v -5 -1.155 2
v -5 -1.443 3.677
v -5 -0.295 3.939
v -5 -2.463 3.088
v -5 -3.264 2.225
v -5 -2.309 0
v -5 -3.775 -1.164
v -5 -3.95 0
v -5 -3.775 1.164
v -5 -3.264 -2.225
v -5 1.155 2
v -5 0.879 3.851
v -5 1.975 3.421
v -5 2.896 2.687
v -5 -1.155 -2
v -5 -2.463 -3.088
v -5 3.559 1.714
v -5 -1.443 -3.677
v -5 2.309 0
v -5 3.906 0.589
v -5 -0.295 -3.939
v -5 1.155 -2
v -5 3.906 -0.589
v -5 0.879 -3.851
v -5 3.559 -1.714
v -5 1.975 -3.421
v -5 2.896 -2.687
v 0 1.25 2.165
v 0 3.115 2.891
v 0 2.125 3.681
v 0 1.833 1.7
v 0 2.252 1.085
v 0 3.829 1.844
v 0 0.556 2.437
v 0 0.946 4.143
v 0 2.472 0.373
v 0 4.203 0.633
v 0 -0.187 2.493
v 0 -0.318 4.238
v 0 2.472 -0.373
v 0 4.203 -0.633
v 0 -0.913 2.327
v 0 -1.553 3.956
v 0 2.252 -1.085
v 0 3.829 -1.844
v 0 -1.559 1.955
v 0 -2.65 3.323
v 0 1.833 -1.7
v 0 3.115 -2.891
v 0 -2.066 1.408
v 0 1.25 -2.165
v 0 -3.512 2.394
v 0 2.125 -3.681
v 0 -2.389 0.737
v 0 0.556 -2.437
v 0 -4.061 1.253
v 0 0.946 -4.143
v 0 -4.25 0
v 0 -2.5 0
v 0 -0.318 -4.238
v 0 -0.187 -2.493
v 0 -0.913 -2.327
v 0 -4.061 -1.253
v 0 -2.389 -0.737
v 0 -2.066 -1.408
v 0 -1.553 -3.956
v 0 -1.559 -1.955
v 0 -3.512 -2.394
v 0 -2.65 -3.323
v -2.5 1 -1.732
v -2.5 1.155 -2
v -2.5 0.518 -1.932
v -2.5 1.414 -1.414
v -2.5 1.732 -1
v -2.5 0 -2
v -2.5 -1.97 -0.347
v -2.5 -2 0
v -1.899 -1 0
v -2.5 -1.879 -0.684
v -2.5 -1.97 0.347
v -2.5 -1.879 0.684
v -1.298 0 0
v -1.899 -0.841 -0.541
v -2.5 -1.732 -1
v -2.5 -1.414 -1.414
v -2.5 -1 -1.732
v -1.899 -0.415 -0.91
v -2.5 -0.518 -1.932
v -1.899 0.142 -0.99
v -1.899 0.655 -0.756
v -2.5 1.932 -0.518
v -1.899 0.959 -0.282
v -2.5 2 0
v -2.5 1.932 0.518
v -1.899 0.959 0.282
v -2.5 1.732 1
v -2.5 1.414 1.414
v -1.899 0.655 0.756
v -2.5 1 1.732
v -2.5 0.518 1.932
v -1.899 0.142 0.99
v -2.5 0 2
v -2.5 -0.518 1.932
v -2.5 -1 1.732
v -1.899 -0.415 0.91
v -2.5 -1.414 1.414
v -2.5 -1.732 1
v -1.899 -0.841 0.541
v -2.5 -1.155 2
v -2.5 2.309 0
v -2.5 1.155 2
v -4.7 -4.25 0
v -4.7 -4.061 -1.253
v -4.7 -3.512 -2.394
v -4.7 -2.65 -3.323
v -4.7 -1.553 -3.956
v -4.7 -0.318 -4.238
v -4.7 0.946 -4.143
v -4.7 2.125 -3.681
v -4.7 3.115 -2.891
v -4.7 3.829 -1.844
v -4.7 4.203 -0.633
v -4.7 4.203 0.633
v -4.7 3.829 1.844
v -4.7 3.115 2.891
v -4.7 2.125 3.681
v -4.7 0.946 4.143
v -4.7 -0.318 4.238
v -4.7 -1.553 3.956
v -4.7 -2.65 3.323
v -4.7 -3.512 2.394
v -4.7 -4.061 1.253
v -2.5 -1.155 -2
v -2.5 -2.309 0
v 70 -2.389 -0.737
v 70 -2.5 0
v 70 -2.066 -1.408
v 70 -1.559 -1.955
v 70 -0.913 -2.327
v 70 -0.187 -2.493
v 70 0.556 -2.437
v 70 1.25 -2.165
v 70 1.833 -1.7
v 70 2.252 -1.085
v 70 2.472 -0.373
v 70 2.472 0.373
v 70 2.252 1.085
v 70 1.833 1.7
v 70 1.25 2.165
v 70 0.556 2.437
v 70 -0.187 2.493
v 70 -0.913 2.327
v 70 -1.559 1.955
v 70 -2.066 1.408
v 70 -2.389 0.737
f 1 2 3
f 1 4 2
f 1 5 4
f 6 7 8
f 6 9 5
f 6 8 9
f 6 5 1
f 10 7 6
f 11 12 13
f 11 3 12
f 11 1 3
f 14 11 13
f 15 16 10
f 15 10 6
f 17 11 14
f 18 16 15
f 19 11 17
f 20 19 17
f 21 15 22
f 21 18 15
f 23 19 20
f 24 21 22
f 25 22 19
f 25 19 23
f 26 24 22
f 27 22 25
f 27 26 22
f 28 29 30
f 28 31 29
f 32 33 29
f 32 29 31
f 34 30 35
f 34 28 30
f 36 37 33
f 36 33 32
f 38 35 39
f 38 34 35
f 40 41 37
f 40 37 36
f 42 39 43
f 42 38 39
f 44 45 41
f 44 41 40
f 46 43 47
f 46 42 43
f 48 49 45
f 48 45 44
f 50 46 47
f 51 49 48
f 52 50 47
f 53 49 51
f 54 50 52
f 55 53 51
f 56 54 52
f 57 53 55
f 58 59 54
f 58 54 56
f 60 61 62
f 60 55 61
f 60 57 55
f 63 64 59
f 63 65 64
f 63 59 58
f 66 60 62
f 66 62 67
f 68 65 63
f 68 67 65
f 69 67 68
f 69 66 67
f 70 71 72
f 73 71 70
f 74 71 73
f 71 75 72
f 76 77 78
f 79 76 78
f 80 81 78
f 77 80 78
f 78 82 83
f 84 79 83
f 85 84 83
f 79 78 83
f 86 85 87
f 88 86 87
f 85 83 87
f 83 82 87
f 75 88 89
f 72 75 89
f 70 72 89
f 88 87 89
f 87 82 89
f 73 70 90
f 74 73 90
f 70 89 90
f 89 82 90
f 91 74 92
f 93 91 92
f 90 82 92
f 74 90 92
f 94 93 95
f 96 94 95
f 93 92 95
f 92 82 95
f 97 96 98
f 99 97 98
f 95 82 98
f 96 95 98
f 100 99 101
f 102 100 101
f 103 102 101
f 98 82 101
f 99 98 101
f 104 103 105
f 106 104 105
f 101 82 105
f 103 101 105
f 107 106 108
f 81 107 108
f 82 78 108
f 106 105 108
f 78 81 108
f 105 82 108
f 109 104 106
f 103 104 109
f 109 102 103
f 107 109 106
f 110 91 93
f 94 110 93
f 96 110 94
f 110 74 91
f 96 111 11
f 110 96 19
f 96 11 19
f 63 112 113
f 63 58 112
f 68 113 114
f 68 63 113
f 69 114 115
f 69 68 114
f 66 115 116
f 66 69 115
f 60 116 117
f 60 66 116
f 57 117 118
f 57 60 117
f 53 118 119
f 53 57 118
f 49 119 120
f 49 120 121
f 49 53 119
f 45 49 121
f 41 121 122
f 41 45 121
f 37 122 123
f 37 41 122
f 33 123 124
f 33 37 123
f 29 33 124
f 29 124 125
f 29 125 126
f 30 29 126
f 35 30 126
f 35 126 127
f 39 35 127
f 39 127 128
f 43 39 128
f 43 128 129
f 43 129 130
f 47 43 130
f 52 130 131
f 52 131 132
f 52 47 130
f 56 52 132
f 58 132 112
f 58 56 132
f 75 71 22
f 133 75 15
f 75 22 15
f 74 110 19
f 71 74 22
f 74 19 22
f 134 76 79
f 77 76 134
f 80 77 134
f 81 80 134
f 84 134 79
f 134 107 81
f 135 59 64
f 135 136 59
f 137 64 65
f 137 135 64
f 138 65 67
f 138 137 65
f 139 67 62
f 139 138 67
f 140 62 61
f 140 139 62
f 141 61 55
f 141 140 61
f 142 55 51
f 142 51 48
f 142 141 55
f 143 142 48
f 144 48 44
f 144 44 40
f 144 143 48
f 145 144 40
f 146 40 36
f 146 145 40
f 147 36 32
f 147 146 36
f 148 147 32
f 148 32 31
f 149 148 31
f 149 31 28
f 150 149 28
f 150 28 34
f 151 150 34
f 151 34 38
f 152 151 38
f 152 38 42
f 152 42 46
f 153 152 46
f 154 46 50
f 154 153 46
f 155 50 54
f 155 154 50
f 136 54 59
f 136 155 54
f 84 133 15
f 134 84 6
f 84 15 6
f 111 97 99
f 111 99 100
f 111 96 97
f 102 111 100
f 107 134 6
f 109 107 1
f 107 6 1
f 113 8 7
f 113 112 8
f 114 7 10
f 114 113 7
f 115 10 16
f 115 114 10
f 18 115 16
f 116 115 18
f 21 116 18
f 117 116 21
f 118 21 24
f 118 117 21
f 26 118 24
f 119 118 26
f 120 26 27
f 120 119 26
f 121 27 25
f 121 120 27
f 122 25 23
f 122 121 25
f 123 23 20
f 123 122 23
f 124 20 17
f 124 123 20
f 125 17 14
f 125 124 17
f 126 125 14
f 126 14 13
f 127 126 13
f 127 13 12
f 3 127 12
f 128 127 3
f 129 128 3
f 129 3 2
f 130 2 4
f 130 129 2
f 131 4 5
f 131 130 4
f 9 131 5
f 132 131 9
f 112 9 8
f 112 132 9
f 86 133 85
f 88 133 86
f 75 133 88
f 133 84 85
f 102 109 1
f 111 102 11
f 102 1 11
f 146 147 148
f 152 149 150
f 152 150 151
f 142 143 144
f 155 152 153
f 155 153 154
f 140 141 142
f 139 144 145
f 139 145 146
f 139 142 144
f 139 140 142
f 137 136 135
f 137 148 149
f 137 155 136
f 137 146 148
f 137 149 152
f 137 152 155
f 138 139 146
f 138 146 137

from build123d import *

# Parameters (mm, degrees)
CUT_EXTRUDE1_DEPTH = 2.5


with BuildPart() as part:
    # Sketch1 → Revolve1 (revolve)
    with BuildSketch(Plane.XY, mode=Mode.PRIVATE) as revolve1_sk:
        Polygon((-5, 0), (-5, 3.95), (-4.7, 4.25), (0, 4.25), (0, 2.5), (70, 2.5), (70, 0), align=None)
    revolve(revolve1_sk.sketch.rotate(Axis((-5, 0, 0), (1, 0, 0)), 180), axis=Axis((-5, 0, 0), (1, 0, 0)))

    # Sketch2 → Cut-Extrude1 (cut)
    with BuildSketch(Plane.ZY.offset(5)):
        Polygon((0, 2.309401077), (-2, 1.154700538), (-2, -1.154700538), (0, -2.309401077), (2, -1.154700538), (2, 1.154700538), align=None)
    extrude(amount=-CUT_EXTRUDE1_DEPTH, mode=Mode.SUBTRACT)

    # Sketch3 → Cut-Revolve1 (revolve, cut)
    with BuildSketch(Plane.XY, mode=Mode.PRIVATE) as cut_revolve1_sk:
        Polygon((-2.5, 0), (-2.5, 2), (-1.298278762, 0), align=None)
    revolve(cut_revolve1_sk.sketch.rotate(Axis((-2.5, 0, 0), (1, 0, 0)), 180), axis=Axis((-2.5, 0, 0), (1, 0, 0)), mode=Mode.SUBTRACT)


solid = part.part
